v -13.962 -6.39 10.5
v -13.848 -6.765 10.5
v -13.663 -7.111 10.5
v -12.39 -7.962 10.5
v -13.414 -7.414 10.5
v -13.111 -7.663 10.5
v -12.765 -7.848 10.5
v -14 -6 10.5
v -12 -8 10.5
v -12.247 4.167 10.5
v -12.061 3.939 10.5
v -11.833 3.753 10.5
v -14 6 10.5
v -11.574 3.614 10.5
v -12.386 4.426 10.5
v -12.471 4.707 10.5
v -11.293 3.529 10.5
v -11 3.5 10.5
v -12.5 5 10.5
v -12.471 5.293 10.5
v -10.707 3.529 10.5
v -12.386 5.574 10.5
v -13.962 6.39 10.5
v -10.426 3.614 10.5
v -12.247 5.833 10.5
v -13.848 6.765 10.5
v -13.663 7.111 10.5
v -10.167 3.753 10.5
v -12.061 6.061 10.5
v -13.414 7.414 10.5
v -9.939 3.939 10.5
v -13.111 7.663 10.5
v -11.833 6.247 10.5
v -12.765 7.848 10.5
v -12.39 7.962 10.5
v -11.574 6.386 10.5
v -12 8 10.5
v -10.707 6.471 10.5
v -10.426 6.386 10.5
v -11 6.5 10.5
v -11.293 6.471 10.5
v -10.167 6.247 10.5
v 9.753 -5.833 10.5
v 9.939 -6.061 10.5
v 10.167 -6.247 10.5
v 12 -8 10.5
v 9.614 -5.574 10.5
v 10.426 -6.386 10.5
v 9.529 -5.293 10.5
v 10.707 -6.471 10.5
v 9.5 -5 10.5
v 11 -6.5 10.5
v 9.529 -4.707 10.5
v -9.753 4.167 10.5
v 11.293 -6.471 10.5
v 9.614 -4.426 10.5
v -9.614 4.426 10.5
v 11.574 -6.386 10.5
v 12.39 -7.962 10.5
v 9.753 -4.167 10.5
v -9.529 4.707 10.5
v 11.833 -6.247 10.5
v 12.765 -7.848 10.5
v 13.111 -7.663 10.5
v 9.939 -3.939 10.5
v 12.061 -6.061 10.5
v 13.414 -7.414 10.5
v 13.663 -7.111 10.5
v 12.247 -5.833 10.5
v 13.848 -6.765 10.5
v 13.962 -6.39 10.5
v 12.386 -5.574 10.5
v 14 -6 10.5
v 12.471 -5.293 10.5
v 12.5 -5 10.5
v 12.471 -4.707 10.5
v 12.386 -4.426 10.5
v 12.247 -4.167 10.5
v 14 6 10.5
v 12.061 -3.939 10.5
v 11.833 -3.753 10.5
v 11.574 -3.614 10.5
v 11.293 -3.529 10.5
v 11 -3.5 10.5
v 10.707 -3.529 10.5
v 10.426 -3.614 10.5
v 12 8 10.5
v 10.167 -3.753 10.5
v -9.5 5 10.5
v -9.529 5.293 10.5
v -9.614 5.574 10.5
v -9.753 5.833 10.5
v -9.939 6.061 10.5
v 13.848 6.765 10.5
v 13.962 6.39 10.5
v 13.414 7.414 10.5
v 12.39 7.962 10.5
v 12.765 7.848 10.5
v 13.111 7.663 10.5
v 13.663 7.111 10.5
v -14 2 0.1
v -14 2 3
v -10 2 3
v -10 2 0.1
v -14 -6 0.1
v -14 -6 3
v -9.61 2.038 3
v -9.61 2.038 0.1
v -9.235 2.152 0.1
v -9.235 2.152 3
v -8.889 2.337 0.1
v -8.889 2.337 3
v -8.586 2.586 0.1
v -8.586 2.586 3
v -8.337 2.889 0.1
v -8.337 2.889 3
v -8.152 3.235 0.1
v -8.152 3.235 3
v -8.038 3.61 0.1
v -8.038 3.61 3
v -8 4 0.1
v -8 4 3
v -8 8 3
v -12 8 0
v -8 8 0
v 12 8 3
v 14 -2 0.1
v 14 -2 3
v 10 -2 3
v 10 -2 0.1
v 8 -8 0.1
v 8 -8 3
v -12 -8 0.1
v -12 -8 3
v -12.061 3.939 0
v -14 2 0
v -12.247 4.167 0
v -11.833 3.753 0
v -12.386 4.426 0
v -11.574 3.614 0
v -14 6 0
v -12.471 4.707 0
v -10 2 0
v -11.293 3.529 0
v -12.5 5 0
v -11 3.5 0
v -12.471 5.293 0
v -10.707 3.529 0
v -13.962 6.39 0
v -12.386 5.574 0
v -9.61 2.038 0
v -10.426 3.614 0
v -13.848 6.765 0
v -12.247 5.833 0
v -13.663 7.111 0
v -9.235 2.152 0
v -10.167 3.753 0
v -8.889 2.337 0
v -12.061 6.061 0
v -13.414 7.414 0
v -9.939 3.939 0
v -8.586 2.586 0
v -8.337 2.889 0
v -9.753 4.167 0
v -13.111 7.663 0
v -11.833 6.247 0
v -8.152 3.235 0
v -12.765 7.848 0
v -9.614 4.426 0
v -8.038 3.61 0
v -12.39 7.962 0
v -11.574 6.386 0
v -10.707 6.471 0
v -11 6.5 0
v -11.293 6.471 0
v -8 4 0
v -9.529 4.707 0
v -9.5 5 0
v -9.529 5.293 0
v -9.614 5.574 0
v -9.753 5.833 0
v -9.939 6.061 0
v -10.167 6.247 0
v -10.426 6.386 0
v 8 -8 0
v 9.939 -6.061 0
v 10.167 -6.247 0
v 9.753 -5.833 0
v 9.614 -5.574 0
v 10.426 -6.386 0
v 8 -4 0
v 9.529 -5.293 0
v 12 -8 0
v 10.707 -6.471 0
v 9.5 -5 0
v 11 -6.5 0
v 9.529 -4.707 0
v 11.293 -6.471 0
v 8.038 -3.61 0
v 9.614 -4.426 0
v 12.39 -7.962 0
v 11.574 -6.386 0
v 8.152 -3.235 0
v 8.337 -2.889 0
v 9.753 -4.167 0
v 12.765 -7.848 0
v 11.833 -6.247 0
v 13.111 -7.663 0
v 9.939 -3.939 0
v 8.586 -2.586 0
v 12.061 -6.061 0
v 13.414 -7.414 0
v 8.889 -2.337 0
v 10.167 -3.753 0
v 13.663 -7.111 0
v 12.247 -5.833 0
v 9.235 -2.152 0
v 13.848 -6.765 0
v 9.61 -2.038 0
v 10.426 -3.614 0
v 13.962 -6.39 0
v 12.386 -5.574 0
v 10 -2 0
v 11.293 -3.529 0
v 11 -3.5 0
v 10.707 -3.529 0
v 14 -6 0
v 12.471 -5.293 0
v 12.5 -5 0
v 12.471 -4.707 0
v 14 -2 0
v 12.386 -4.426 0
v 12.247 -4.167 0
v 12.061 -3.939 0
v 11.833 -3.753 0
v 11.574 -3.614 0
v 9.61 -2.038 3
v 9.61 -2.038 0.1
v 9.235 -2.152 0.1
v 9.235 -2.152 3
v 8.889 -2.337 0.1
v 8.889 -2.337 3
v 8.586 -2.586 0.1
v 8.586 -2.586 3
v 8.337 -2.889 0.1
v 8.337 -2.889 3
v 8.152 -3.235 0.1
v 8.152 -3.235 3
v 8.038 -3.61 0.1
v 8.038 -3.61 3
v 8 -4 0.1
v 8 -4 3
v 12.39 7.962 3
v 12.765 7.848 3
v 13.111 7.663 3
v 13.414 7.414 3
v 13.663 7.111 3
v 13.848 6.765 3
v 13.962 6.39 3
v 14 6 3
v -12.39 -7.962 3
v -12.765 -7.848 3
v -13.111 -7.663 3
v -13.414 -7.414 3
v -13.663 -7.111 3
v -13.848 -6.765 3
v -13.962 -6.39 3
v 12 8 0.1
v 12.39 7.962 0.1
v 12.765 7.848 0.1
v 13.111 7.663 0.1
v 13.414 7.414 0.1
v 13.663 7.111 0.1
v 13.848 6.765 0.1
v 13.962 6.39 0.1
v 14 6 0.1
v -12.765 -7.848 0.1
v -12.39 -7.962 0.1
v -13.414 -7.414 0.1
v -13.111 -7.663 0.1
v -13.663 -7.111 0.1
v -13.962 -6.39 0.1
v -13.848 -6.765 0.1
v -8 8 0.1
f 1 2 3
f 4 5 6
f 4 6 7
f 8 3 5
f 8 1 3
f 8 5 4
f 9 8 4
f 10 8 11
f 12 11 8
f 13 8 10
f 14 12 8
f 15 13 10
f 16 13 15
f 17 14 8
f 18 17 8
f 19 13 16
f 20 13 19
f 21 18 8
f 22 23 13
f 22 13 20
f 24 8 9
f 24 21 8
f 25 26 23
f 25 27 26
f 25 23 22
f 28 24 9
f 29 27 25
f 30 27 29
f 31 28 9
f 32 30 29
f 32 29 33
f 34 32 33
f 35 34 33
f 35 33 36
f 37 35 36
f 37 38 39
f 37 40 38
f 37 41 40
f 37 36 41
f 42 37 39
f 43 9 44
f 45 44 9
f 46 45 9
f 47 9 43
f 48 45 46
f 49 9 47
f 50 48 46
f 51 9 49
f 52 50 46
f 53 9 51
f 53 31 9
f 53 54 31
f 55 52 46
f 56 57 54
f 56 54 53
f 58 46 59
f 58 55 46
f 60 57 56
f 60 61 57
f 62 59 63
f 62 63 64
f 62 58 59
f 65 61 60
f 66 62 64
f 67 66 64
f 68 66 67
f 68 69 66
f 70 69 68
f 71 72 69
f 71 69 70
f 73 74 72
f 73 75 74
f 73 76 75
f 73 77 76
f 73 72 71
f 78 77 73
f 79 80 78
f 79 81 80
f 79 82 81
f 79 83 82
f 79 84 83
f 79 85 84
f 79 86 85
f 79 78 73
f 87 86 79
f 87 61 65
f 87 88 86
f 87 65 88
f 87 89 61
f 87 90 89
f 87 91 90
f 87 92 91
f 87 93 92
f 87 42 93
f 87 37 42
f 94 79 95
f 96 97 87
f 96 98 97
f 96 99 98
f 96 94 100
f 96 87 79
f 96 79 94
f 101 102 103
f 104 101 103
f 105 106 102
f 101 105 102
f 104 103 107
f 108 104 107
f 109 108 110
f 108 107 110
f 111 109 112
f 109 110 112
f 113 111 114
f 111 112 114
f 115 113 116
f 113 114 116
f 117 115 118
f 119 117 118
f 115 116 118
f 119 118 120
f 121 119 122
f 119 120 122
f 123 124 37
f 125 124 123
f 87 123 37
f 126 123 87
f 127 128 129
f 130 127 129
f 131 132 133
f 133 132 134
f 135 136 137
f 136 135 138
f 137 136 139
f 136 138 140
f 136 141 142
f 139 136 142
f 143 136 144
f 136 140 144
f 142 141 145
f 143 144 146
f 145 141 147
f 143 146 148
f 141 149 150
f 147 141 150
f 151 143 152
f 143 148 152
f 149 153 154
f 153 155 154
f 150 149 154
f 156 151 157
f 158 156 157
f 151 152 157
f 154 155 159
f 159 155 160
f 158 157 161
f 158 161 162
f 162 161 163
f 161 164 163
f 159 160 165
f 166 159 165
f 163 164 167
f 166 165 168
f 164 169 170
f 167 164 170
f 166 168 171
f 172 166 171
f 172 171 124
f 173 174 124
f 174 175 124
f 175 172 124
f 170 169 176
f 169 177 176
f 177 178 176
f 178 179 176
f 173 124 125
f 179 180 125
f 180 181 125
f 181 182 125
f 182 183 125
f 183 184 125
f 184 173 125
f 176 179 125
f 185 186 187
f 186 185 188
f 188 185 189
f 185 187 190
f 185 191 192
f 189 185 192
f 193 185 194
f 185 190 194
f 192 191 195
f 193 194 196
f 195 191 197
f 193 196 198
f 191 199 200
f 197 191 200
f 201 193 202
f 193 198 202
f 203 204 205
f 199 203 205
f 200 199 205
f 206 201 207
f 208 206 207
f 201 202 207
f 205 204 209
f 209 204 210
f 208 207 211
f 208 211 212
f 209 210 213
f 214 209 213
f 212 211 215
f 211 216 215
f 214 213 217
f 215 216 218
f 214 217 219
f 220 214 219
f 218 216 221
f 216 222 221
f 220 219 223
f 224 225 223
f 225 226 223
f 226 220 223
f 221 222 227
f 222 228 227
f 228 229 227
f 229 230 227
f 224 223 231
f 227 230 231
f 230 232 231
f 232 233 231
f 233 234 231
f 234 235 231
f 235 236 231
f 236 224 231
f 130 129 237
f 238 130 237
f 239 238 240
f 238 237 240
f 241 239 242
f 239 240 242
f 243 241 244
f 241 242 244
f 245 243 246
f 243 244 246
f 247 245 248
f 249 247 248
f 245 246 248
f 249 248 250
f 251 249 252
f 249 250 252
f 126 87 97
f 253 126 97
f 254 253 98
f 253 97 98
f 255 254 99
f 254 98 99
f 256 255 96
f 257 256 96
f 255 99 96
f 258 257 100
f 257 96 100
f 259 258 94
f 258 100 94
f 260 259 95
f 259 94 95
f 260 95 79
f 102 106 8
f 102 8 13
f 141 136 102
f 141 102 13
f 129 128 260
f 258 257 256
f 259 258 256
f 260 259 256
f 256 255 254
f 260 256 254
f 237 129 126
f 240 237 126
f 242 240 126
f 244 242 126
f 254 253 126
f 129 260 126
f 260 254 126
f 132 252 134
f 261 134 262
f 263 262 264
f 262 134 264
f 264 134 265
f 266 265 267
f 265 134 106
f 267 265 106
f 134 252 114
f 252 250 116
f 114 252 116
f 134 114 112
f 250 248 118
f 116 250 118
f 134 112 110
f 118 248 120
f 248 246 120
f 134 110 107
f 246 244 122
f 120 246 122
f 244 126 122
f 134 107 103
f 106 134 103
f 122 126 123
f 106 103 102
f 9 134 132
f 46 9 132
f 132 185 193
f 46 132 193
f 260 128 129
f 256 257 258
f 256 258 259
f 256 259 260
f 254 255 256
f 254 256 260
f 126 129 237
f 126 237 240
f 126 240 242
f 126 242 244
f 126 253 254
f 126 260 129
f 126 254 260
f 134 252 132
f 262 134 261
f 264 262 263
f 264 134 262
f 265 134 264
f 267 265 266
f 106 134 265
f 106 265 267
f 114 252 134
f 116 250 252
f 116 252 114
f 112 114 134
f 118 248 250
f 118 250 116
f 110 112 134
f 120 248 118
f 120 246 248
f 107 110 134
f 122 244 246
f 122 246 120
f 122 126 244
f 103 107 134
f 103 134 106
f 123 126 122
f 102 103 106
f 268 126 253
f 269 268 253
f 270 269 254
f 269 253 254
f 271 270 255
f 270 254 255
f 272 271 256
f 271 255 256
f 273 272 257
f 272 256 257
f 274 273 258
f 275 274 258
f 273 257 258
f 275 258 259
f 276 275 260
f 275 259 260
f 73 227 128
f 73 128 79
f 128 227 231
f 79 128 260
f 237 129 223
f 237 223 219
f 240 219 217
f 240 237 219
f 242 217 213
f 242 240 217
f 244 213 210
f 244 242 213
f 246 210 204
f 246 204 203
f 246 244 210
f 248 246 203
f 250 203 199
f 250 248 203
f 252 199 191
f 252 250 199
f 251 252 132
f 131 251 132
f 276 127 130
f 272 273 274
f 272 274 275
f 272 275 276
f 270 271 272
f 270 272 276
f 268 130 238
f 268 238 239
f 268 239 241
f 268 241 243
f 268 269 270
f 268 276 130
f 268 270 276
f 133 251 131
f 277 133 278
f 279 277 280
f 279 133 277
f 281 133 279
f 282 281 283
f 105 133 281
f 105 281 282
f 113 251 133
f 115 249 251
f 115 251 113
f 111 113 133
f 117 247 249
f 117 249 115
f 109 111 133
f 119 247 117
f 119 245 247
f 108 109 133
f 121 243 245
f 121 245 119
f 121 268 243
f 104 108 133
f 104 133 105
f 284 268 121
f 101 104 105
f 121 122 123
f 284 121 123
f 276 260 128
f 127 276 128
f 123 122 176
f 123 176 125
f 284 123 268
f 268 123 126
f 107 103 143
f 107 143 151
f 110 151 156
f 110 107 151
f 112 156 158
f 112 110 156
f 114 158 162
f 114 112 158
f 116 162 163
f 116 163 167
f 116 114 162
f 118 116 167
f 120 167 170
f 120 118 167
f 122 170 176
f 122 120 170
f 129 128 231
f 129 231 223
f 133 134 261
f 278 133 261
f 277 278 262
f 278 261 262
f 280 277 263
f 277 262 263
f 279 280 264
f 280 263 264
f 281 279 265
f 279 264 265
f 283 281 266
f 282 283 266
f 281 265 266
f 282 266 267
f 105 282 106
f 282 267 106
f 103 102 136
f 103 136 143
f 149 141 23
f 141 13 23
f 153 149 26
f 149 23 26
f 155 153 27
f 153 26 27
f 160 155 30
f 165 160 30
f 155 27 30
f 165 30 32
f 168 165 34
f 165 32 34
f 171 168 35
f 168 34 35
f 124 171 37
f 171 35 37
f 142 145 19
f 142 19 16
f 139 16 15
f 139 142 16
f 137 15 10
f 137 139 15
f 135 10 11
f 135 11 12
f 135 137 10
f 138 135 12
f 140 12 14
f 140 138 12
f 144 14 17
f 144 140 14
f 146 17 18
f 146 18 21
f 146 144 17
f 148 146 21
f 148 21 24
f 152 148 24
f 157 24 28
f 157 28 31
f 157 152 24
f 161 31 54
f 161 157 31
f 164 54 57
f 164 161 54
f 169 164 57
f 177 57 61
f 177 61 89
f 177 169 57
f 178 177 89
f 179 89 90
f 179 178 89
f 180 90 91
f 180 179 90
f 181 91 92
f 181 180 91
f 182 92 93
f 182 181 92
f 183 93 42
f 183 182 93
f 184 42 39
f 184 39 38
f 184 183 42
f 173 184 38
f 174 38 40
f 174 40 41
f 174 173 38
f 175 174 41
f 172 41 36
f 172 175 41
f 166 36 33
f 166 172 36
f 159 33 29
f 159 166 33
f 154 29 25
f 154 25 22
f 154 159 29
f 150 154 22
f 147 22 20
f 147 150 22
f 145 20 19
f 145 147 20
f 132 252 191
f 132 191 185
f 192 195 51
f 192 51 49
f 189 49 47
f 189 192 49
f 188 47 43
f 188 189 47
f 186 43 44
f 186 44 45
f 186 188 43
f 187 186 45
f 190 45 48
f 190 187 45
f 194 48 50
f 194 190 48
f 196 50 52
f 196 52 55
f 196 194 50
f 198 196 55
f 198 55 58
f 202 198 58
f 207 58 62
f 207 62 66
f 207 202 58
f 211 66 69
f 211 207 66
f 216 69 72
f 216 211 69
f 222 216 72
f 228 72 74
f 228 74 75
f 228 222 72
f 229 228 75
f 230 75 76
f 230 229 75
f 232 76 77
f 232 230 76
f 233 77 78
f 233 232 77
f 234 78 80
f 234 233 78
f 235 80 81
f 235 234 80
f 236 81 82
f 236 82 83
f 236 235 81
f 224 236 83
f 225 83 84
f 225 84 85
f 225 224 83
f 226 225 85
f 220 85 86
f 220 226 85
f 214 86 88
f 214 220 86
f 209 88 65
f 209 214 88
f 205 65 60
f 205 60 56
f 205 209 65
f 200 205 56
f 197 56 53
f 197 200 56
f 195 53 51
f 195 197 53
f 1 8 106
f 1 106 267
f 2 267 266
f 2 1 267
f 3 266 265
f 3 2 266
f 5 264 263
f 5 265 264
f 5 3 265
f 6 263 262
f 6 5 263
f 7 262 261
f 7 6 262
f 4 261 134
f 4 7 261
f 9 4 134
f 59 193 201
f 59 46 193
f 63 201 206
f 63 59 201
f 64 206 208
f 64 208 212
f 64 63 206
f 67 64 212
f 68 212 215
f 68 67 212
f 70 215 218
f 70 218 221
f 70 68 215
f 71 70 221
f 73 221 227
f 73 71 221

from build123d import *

# Parameters (mm, degrees)
SKETCH1_W           = 28
SKETCH1_H           = 16
SKETCH1_R           = 1.5
BOSS_EXTRUDE1_DEPTH = 10.5
FILLET1_R           = 2
CUT_EXTRUDE1_START  = -3
CUT_EXTRUDE1_DEPTH  = 3
BOSS_EXTRUDE2_DEPTH = 2.9


with BuildPart() as part:
    # Sketch1 → Boss-Extrude1 (new body)
    with BuildSketch(Plane.XY):
        Rectangle(SKETCH1_W, SKETCH1_H)
        with Locations(Location((-11, 5, 0), (0, 0, 180))):
            Circle(SKETCH1_R, mode=Mode.SUBTRACT)
        with Locations(Location((11, -5, 0), (0, 0, 180))):
            Circle(SKETCH1_R, mode=Mode.SUBTRACT)
    extrude(amount=BOSS_EXTRUDE1_DEPTH)

    # Fillet1
    fillet1_edges = [part.edges().sort_by_distance(p)[0] for p in [
        (14, -8, 5.25),
        (-14, -8, 5.25),
        (-14, 8, 5.25),
        (14, 8, 5.25),
    ]]
    fillet(fillet1_edges, radius=FILLET1_R)

    # Sketch3 → Cut-Extrude1 (cut)
    with BuildSketch(Plane(origin=(0, 0, 0), x_dir=(-1, 0, 0), z_dir=(0, 0, -1)).offset(CUT_EXTRUDE1_START)):
        with BuildLine():
            Line((-14, -2), (-10, -2))
            ThreePointArc((-10, -2), (-8.585786438, -2.585786438), (-8, -4))
            Line((-8, -4), (-8, -8))
            Line((-8, -8), (12, -8))
            ThreePointArc((12, -8), (13.414213562, -7.414213562), (14, -6))
            Line((14, -6), (14, 2))
            Line((14, 2), (10, 2))
            ThreePointArc((10, 2), (8.585786438, 2.585786438), (8, 4))
            Line((8, 4), (8, 8))
            Line((8, 8), (-12, 8))
            ThreePointArc((-12, 8), (-13.414213562, 7.414213562), (-14, 6))
            Line((-14, 6), (-14, -2))
        make_face()
    extrude(amount=CUT_EXTRUDE1_DEPTH, mode=Mode.SUBTRACT)


with BuildPart() as body_2:
    # Sketch5 → Boss-Extrude2 (new body)
    with BuildSketch(Plane(origin=(0, 0, 3), x_dir=(-1, 0, 0), z_dir=(0, 0, -1))):
        with BuildLine():
            Line((-14, 6), (-14, -2))
            Line((-14, -2), (-10, -2))
            ThreePointArc((-10, -2), (-8.585786438, -2.585786438), (-8, -4))
            Line((-8, -4), (-8, -8))
            Line((-8, -8), (12, -8))
            ThreePointArc((12, -8), (13.414213562, -7.414213562), (14, -6))
            Line((14, -6), (14, 2))
            Line((14, 2), (10, 2))
            ThreePointArc((10, 2), (8.585786438, 2.585786438), (8, 4))
            Line((8, 4), (8, 8))
            Line((8, 8), (-12, 8))
            ThreePointArc((-12, 8), (-13.414213562, 7.414213562), (-14, 6))
        make_face()
    extrude(amount=BOSS_EXTRUDE2_DEPTH)


solid = Compound([part.part, body_2.part])
